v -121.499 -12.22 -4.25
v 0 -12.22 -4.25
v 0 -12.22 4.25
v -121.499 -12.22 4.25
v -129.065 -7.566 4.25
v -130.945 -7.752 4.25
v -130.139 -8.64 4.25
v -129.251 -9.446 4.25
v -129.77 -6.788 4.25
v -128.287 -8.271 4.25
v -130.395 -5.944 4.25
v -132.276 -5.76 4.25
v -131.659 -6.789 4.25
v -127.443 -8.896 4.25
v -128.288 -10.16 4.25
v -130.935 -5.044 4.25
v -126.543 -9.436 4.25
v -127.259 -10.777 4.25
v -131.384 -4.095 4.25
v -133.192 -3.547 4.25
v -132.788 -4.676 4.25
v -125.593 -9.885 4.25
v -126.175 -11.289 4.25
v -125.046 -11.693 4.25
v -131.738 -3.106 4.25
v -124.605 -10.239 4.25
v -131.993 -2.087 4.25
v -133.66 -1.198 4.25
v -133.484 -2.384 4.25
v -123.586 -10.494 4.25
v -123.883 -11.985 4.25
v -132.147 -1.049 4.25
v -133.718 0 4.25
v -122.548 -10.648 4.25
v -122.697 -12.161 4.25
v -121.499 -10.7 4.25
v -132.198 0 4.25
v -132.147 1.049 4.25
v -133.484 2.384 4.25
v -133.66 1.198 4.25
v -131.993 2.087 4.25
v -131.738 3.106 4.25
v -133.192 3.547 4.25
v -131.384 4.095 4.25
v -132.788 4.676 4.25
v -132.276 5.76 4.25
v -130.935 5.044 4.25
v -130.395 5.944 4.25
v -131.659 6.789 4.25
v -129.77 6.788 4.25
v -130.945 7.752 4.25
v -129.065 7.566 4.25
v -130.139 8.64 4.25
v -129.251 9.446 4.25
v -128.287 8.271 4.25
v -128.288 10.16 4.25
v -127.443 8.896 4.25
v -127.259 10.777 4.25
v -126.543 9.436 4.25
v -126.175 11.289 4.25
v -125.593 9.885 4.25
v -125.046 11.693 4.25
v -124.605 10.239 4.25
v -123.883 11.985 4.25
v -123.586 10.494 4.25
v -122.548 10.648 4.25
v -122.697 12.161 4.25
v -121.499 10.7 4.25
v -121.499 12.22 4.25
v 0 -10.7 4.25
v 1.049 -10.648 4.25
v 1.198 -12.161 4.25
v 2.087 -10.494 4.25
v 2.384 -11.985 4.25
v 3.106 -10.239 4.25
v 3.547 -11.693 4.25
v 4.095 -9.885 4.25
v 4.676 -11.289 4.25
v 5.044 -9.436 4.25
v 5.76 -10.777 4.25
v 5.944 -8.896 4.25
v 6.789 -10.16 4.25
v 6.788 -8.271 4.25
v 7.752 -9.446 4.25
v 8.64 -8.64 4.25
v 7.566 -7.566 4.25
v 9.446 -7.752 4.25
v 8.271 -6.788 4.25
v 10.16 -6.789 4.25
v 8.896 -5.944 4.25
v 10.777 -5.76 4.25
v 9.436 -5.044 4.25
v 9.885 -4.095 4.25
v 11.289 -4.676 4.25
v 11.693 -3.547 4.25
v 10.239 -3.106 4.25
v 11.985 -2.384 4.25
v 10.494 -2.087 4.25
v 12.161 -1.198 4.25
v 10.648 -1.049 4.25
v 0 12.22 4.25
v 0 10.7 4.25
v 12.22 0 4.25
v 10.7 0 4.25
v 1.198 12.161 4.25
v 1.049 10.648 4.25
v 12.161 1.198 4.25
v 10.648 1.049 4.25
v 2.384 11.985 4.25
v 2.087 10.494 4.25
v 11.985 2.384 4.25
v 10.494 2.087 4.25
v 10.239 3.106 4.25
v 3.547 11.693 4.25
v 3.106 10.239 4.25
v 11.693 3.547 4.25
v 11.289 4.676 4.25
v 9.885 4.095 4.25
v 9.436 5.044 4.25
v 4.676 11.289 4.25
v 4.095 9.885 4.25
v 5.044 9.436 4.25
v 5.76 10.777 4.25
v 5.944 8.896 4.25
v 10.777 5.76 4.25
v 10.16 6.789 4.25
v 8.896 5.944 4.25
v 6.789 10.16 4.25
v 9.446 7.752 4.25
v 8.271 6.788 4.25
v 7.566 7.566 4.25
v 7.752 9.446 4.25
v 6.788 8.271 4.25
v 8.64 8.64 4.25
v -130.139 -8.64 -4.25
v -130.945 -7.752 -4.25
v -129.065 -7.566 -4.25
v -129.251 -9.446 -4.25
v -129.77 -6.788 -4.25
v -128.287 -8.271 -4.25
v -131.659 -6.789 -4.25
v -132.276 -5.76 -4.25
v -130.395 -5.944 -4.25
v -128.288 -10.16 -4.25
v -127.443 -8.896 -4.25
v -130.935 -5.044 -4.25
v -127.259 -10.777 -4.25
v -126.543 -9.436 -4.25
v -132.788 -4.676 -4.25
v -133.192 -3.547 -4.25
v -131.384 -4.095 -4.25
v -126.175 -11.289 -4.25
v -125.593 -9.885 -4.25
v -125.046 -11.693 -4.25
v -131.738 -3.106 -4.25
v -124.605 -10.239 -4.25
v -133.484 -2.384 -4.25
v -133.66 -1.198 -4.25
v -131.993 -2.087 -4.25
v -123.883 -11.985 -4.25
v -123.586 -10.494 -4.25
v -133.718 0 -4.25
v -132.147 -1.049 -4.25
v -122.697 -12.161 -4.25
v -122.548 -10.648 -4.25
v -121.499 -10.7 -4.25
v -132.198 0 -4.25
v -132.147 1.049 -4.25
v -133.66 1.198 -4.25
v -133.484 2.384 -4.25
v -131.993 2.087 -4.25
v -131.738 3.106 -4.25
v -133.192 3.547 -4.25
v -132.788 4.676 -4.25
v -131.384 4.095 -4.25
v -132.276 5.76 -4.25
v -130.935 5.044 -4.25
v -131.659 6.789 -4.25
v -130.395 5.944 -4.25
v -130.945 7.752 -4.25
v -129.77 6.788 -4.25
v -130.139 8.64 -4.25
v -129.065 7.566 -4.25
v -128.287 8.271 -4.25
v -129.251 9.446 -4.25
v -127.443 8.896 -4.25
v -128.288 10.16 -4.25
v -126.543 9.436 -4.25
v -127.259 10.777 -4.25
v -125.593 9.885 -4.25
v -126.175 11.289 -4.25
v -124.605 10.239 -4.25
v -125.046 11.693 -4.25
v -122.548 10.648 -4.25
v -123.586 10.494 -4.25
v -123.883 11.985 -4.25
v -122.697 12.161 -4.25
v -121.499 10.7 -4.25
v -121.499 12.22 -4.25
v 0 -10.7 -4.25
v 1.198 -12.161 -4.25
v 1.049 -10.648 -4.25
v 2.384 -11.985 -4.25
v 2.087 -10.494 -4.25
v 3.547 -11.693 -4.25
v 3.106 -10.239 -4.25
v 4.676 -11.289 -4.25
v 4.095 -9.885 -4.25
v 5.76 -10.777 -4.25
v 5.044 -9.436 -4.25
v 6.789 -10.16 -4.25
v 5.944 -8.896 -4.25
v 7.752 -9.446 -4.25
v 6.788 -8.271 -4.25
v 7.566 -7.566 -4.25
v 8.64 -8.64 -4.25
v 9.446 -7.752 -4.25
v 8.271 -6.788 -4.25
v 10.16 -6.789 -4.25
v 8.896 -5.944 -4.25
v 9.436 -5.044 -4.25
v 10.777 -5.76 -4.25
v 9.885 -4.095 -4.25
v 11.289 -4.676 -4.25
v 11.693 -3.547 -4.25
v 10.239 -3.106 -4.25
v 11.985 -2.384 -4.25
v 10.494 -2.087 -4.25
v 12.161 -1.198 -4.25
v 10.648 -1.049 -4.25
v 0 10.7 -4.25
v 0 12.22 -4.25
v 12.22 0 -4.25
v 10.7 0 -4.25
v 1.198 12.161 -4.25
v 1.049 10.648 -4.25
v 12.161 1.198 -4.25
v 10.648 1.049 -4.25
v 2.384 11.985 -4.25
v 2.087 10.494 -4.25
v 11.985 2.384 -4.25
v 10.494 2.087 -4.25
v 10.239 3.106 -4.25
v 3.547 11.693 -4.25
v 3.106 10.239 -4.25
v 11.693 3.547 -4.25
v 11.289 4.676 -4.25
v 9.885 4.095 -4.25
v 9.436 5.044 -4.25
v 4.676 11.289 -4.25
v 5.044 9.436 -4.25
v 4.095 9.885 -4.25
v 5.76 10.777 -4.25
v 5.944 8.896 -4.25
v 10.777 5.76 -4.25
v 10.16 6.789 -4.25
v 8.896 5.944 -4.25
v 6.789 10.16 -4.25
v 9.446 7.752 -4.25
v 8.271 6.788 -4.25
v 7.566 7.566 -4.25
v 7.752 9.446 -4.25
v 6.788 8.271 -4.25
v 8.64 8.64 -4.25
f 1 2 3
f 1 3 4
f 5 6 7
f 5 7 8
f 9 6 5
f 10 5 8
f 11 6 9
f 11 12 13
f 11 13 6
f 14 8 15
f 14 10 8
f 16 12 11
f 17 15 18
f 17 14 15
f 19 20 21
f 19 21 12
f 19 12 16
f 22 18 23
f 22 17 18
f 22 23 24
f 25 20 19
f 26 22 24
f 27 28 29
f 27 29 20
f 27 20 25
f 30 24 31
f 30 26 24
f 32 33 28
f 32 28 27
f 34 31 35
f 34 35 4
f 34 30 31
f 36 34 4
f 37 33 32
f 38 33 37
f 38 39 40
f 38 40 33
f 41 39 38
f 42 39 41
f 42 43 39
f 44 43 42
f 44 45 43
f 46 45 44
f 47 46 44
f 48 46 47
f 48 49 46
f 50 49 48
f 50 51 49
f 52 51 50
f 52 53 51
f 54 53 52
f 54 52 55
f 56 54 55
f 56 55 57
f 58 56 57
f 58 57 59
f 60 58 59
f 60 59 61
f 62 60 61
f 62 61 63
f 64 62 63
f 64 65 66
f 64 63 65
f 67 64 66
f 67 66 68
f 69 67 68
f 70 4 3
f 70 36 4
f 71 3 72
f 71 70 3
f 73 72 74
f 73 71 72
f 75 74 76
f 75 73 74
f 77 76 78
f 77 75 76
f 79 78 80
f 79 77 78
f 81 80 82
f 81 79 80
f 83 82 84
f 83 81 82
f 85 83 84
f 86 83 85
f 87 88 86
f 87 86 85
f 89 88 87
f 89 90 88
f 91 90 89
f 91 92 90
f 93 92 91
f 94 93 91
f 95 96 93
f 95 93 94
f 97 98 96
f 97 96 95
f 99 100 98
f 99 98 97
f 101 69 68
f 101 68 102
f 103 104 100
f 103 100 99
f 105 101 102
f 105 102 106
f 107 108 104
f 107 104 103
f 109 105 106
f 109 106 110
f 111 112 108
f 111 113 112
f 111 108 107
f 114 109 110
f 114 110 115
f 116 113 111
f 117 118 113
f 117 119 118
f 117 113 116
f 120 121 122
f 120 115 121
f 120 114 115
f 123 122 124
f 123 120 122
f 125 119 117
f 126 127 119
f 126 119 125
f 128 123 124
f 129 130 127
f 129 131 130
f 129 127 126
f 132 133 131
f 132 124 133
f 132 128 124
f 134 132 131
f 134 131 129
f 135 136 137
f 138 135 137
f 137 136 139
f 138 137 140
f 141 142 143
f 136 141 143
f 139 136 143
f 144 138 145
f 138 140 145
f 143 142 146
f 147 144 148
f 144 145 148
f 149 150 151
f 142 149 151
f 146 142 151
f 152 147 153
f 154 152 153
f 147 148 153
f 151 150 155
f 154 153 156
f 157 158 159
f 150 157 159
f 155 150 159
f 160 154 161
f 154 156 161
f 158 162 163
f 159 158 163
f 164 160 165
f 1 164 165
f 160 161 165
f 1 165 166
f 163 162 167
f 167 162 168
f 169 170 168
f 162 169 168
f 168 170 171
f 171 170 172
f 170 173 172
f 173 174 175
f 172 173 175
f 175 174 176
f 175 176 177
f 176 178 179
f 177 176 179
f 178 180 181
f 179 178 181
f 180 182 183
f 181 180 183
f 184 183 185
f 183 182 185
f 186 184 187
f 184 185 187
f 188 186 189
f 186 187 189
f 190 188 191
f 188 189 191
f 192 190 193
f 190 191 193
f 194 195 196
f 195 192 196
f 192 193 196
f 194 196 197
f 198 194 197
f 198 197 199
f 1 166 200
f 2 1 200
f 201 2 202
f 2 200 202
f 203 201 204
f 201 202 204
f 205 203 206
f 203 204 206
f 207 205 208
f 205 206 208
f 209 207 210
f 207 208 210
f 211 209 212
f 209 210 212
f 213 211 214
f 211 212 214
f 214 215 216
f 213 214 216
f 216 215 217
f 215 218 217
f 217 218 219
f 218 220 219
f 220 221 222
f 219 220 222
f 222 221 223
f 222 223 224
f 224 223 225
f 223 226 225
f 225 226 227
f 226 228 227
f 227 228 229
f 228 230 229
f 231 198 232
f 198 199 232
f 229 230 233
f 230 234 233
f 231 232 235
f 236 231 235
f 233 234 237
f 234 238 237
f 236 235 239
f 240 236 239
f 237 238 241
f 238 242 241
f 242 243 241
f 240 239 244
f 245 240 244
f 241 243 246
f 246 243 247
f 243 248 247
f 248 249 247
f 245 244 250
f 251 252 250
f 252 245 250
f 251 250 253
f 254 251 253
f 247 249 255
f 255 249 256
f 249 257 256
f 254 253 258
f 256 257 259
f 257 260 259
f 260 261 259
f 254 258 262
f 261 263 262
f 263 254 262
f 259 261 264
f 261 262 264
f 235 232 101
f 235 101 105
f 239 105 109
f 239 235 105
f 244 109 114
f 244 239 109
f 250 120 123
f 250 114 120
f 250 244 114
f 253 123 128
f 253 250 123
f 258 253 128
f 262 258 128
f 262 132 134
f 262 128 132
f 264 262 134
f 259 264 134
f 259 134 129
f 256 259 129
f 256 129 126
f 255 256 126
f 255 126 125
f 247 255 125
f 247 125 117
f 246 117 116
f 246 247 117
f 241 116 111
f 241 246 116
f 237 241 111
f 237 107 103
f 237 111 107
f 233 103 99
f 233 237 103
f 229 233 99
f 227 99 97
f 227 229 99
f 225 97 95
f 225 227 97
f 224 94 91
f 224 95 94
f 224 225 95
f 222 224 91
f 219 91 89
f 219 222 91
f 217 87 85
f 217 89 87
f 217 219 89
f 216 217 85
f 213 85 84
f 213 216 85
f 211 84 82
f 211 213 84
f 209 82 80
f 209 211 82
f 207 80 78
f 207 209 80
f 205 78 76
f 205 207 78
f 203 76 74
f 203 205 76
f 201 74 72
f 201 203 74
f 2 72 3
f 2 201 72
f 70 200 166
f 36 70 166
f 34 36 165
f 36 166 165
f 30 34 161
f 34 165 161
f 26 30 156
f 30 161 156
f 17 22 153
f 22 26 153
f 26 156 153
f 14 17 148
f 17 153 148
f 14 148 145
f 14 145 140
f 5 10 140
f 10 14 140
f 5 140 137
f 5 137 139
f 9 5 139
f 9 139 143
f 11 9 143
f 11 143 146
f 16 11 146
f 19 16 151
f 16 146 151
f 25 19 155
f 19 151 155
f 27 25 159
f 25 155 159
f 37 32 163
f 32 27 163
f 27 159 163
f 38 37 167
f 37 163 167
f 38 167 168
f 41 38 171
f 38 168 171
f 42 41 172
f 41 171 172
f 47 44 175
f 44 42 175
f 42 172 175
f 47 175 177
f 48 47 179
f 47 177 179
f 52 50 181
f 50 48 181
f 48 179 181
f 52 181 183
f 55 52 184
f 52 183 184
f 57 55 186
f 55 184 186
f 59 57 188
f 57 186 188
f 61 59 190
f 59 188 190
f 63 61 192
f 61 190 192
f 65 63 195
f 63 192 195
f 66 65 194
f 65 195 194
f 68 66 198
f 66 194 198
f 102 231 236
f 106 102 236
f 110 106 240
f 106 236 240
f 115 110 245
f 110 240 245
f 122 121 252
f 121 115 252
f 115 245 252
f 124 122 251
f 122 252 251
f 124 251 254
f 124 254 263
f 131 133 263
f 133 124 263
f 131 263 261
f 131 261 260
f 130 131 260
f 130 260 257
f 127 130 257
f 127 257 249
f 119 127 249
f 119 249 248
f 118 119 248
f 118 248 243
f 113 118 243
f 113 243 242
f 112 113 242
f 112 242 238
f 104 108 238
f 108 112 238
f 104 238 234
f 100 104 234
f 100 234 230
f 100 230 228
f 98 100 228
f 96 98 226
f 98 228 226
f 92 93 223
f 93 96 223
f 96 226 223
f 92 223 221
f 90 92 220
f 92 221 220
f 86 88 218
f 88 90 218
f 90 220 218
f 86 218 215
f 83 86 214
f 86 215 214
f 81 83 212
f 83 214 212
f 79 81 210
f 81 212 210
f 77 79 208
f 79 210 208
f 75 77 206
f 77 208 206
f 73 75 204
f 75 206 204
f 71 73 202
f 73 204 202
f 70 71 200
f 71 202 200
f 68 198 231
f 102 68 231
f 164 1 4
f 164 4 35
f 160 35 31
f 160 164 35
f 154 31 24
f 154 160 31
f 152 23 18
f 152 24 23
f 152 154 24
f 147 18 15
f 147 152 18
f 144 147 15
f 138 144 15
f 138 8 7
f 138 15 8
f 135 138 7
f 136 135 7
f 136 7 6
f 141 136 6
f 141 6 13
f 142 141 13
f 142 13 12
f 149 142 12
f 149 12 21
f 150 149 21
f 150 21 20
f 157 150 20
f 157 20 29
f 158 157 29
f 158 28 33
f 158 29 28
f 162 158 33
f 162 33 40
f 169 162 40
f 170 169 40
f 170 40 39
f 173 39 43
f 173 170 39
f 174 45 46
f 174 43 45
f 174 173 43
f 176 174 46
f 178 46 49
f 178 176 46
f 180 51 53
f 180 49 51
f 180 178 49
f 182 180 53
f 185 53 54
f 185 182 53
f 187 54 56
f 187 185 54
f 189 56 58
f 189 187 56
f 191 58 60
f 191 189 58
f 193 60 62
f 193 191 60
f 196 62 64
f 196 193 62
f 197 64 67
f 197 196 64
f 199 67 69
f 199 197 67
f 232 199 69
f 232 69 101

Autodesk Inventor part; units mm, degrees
ref_plane "YZ Plane" through (0, 0, 0) normal (1, 0, 0) x (0, 1, 0)
ref_plane "XZ Plane" through (0, 0, 0) normal (0, 1, 0) x (-1, 0, 0)
ref_plane "XY Plane" through (0, 0, 0) normal (0, 0, 1) x (1, 0, 0)
sketch "Sketch1" plane through (0, 0, 0) normal (0, 0, 1) x (1, 0, 0)
  arc A0 (0, -11.4595) -> (0, 11.4595) centre (0, 0) ccw construction
  arc A1 (-121.4989, 11.4595) -> (-121.4989, -11.4595) centre (-121.4989, 0) ccw construction
  line L0 (0, -11.4595) -> (-121.4989, -11.4595) construction
  line L1 (0, 11.4595) -> (-121.4989, 11.4595) construction
  dimension "Belt_Teeth" = 105
  dimension "Belt_Pitch2" = 3
  dimension "d0" = 22.919
  dimension "d1" = 22.919
  dimension "d2" = 36.0011
  dimension "d3" = 36.0011
  dimension "Center_Distance" = 121.4989
  dimension "d5" = 121.4989
sketch "Sketch2" plane through (0, 0, 0) normal (0, 0, 1) x (1, 0, 0)
  line L0 (35.7235, 34.2567) -> (38.7235, 34.2567)
  point P0 (0, 0)
  dimension "Belt_Pitch2" = 3
sketch "Sketch4" plane through (0, 0, 0) normal (0, 0, 1) x (1, 0, 0)
  line L0 (-16.1422, -21.869) -> (-14.1422, -21.869)
  line L1 (-16.1422, -21.869) -> (-16.1422, -20.349)
  arc A0 (-15.5872, -20.904) -> (-16.1422, -20.349) centre (-16.1422, -20.904) ccw
  line L2 (-15.5872, -20.904) -> (-15.5872, -20.959)
  arc A1 (-15.5872, -20.959) -> (-15.4372, -21.109) centre (-15.4372, -20.959) ccw
  line L3 (-15.4372, -21.109) -> (-14.8472, -21.109)
  line L4 (-14.1422, -21.869) -> (-14.1422, -20.349)
  arc A2 (-14.1422, -20.349) -> (-14.6972, -20.904) centre (-14.1422, -20.904) ccw
  arc A3 (-14.8472, -21.109) -> (-14.6972, -20.959) centre (-14.8472, -20.959) ccw
  line L5 (-14.6972, -20.959) -> (-14.6972, -20.904)
  line L6 (0, 11.4595) -> (-121.4989, 11.4595) construction
  arc A4 (-121.4989, 11.4595) -> (-121.4989, -11.4595) centre (-121.4989, 0) ccw construction
  line L7 (0, -11.4595) -> (-121.4989, -11.4595) construction
  arc A5 (0, -11.4595) -> (0, 11.4595) centre (0, 0) ccw construction
  arc A6 (-121.4989, 12.2195) -> (-121.4989, -12.2195) centre (-121.4989, 0) ccw
  line L8 (-121.4989, 12.2195) -> (0, 12.2195)
  arc A7 (0, -12.2195) -> (0, 12.2195) centre (0, 0) ccw
  line L9 (0, -12.2195) -> (-121.4989, -12.2195)
  arc A8 (-121.4989, 10.6995) -> (-121.4989, -10.6995) centre (-121.4989, 0) ccw
  line L10 (-121.4989, 10.6995) -> (0, 10.6995)
  arc A9 (0, -10.6995) -> (0, 10.6995) centre (0, 0) ccw
  line L11 (0, -10.6995) -> (-121.4989, -10.6995)
  point P0 (-15.1422, -21.109)
  point P1 (-15.1422, -21.869)
  dimension "d9" = 2
  dimension "d10" = 1.52
  dimension "d11" = 0.76
  dimension "d12" = 0.555
  dimension "d13" = 0.555
  dimension "d14" = 0.15
  dimension "d15" = 0.15
  dimension "belt_thickness" = 1.52
  dimension "d44" = 0.76
extrude "Extrusion2" add sketch "Sketch4" along normal mid plane 8.5 contours L8 A7 L9 A6
sketch "Sketch5" plane through (0, 0, 4.25) normal (0, 0, 1) x (1, 0, 0)
  line L0 (-121.4989, 10.6995) -> (0, 10.6995) construction
  arc A0 (0, -10.6995) -> (0, 10.6995) centre (0, 0) ccw construction
  line L1 (0, -10.6995) -> (-121.4989, -10.6995) construction
  arc A1 (-121.4989, 10.6995) -> (-121.4989, -10.6995) centre (-121.4989, 0) ccw construction
  arc A2 (-121.4989, 12.2195) -> (-121.4989, -12.2195) centre (-121.4989, 0) ccw construction
  line L2 (-121.4989, -12.2195) -> (0, -12.2195) construction
  arc A3 (0, -12.2195) -> (0, 12.2195) centre (0, 0) ccw construction
  line L3 (0, 12.2195) -> (-121.4989, 12.2195) construction
  line L4 (-7.7556, -2.6989) -> (-5.7556, -2.6989)
  line L5 (-7.7556, -2.6989) -> (-7.7556, -1.1789) construction
  arc A4 (-7.2006, -1.7339) -> (-7.7556, -1.1789) centre (-7.7556, -1.7339) ccw
  line L6 (-7.2006, -1.7339) -> (-7.2006, -1.7889)
  arc A5 (-7.2006, -1.7889) -> (-7.0506, -1.9389) centre (-7.0506, -1.7889) ccw
  line L7 (-7.0506, -1.9389) -> (-6.4606, -1.9389)
  line L8 (-5.7556, -2.6989) -> (-5.7556, -1.1789)
  arc A6 (-5.7556, -1.1789) -> (-6.3106, -1.7339) centre (-5.7556, -1.7339) ccw
  arc A7 (-6.4606, -1.9389) -> (-6.3106, -1.7889) centre (-6.4606, -1.7889) ccw
  line L9 (-6.3106, -1.7889) -> (-6.3106, -1.7339)
  line L10 (-8.3106, -1.7339) -> (-8.3106, -1.7889)
  arc A8 (-7.7556, -1.1789) -> (-8.3106, -1.7339) centre (-7.7556, -1.7339) ccw
  arc A9 (-8.4606, -1.9389) -> (-8.3106, -1.7889) centre (-8.4606, -1.7889) ccw
  line L11 (-8.4606, -1.9389) -> (-9.0506, -1.9389)
  line L12 (-7.7556, -2.6989) -> (-9.7556, -2.6989)
  line L13 (-9.2006, -1.7889) -> (-9.2006, -1.7339)
  arc A10 (-9.2006, -1.7339) -> (-9.7556, -1.1789) centre (-9.7556, -1.7339) ccw
  line L14 (-9.7556, -2.6989) -> (-9.7556, -1.1789)
  arc A11 (-9.2006, -1.7889) -> (-9.0506, -1.9389) centre (-9.0506, -1.7889) ccw
  line L15 (-17.66, -0.8495) -> (-14.922, -0.8495) construction
  line L16 (-14.922, -0.8495) -> (-14.922, -2.3671) construction
  line L17 (-14.922, -2.3671) -> (-17.66, -2.3671) construction
  line L18 (-17.66, -2.3671) -> (-17.66, -0.8495) construction
  arc A12 (-15.6383, -1.7102) -> (-16.7483, -1.7102) centre (-16.1933, -1.7102) ccw construction
  line L19 (-16.7483, -1.7102) -> (-16.7483, -1.7652) construction
  arc A13 (-16.8983, -1.9152) -> (-16.7483, -1.7652) centre (-16.8983, -1.7652) ccw construction
  line L20 (-16.7483, -1.7102) -> (-16.7483, -1.9152) construction
  line L21 (-15.6383, -1.7102) -> (-15.6383, -1.9152) construction
  point P0 (-6.7556, -1.9389)
  point P1 (-6.7556, -2.6989)
  point P2 (-8.7556, -2.6989)
  point P3 (-8.7556, -1.9389)
  dimension "d22" = 2
  dimension "d23" = 1.52
  dimension "d24" = 0.76
  dimension "d25" = 0.555
  dimension "d26" = 0.555
  dimension "d27" = 0.15
  dimension "d28" = 0.15
  dimension "d29" = 0.76
  dimension "d30" = 1
  dimension "d31" = 2
  dimension "d32" = 0.59
  dimension "d34" = 0.555
  dimension "d35" = 0
  dimension "d36" = 0
  dimension "d37" = 0.15
  dimension "d38" = 0.055
  dimension "d39" = 0.055
  dimension "d40" = 0
  dimension "d41" = 0
  dimension "d42" = 0.205
  dimension "d43" = 0.205
equation "\"d13\" = d12"
equation "\"d15\" = d14"
equation "\"d44\" = 0.5 * belt_thickness"
equation "\"d26\" = d25"
equation "\"d28\" = d27"
equation "\"d30\" = 0.5 * d22"
equation "\"d31\" = d22"
equation "\"d43\" = d42"
equation "\"Belt_Teeth\" = 105"
equation "\"Belt_Pitch\" = 3"
equation "\"HTD_5mm\" = 5"
equation "\"GT2_3mm\" = 3"
equation "\"Center_Distance_Copy\" = Center_Distance"
properties part number "GT2-105T" material "Rubber"
